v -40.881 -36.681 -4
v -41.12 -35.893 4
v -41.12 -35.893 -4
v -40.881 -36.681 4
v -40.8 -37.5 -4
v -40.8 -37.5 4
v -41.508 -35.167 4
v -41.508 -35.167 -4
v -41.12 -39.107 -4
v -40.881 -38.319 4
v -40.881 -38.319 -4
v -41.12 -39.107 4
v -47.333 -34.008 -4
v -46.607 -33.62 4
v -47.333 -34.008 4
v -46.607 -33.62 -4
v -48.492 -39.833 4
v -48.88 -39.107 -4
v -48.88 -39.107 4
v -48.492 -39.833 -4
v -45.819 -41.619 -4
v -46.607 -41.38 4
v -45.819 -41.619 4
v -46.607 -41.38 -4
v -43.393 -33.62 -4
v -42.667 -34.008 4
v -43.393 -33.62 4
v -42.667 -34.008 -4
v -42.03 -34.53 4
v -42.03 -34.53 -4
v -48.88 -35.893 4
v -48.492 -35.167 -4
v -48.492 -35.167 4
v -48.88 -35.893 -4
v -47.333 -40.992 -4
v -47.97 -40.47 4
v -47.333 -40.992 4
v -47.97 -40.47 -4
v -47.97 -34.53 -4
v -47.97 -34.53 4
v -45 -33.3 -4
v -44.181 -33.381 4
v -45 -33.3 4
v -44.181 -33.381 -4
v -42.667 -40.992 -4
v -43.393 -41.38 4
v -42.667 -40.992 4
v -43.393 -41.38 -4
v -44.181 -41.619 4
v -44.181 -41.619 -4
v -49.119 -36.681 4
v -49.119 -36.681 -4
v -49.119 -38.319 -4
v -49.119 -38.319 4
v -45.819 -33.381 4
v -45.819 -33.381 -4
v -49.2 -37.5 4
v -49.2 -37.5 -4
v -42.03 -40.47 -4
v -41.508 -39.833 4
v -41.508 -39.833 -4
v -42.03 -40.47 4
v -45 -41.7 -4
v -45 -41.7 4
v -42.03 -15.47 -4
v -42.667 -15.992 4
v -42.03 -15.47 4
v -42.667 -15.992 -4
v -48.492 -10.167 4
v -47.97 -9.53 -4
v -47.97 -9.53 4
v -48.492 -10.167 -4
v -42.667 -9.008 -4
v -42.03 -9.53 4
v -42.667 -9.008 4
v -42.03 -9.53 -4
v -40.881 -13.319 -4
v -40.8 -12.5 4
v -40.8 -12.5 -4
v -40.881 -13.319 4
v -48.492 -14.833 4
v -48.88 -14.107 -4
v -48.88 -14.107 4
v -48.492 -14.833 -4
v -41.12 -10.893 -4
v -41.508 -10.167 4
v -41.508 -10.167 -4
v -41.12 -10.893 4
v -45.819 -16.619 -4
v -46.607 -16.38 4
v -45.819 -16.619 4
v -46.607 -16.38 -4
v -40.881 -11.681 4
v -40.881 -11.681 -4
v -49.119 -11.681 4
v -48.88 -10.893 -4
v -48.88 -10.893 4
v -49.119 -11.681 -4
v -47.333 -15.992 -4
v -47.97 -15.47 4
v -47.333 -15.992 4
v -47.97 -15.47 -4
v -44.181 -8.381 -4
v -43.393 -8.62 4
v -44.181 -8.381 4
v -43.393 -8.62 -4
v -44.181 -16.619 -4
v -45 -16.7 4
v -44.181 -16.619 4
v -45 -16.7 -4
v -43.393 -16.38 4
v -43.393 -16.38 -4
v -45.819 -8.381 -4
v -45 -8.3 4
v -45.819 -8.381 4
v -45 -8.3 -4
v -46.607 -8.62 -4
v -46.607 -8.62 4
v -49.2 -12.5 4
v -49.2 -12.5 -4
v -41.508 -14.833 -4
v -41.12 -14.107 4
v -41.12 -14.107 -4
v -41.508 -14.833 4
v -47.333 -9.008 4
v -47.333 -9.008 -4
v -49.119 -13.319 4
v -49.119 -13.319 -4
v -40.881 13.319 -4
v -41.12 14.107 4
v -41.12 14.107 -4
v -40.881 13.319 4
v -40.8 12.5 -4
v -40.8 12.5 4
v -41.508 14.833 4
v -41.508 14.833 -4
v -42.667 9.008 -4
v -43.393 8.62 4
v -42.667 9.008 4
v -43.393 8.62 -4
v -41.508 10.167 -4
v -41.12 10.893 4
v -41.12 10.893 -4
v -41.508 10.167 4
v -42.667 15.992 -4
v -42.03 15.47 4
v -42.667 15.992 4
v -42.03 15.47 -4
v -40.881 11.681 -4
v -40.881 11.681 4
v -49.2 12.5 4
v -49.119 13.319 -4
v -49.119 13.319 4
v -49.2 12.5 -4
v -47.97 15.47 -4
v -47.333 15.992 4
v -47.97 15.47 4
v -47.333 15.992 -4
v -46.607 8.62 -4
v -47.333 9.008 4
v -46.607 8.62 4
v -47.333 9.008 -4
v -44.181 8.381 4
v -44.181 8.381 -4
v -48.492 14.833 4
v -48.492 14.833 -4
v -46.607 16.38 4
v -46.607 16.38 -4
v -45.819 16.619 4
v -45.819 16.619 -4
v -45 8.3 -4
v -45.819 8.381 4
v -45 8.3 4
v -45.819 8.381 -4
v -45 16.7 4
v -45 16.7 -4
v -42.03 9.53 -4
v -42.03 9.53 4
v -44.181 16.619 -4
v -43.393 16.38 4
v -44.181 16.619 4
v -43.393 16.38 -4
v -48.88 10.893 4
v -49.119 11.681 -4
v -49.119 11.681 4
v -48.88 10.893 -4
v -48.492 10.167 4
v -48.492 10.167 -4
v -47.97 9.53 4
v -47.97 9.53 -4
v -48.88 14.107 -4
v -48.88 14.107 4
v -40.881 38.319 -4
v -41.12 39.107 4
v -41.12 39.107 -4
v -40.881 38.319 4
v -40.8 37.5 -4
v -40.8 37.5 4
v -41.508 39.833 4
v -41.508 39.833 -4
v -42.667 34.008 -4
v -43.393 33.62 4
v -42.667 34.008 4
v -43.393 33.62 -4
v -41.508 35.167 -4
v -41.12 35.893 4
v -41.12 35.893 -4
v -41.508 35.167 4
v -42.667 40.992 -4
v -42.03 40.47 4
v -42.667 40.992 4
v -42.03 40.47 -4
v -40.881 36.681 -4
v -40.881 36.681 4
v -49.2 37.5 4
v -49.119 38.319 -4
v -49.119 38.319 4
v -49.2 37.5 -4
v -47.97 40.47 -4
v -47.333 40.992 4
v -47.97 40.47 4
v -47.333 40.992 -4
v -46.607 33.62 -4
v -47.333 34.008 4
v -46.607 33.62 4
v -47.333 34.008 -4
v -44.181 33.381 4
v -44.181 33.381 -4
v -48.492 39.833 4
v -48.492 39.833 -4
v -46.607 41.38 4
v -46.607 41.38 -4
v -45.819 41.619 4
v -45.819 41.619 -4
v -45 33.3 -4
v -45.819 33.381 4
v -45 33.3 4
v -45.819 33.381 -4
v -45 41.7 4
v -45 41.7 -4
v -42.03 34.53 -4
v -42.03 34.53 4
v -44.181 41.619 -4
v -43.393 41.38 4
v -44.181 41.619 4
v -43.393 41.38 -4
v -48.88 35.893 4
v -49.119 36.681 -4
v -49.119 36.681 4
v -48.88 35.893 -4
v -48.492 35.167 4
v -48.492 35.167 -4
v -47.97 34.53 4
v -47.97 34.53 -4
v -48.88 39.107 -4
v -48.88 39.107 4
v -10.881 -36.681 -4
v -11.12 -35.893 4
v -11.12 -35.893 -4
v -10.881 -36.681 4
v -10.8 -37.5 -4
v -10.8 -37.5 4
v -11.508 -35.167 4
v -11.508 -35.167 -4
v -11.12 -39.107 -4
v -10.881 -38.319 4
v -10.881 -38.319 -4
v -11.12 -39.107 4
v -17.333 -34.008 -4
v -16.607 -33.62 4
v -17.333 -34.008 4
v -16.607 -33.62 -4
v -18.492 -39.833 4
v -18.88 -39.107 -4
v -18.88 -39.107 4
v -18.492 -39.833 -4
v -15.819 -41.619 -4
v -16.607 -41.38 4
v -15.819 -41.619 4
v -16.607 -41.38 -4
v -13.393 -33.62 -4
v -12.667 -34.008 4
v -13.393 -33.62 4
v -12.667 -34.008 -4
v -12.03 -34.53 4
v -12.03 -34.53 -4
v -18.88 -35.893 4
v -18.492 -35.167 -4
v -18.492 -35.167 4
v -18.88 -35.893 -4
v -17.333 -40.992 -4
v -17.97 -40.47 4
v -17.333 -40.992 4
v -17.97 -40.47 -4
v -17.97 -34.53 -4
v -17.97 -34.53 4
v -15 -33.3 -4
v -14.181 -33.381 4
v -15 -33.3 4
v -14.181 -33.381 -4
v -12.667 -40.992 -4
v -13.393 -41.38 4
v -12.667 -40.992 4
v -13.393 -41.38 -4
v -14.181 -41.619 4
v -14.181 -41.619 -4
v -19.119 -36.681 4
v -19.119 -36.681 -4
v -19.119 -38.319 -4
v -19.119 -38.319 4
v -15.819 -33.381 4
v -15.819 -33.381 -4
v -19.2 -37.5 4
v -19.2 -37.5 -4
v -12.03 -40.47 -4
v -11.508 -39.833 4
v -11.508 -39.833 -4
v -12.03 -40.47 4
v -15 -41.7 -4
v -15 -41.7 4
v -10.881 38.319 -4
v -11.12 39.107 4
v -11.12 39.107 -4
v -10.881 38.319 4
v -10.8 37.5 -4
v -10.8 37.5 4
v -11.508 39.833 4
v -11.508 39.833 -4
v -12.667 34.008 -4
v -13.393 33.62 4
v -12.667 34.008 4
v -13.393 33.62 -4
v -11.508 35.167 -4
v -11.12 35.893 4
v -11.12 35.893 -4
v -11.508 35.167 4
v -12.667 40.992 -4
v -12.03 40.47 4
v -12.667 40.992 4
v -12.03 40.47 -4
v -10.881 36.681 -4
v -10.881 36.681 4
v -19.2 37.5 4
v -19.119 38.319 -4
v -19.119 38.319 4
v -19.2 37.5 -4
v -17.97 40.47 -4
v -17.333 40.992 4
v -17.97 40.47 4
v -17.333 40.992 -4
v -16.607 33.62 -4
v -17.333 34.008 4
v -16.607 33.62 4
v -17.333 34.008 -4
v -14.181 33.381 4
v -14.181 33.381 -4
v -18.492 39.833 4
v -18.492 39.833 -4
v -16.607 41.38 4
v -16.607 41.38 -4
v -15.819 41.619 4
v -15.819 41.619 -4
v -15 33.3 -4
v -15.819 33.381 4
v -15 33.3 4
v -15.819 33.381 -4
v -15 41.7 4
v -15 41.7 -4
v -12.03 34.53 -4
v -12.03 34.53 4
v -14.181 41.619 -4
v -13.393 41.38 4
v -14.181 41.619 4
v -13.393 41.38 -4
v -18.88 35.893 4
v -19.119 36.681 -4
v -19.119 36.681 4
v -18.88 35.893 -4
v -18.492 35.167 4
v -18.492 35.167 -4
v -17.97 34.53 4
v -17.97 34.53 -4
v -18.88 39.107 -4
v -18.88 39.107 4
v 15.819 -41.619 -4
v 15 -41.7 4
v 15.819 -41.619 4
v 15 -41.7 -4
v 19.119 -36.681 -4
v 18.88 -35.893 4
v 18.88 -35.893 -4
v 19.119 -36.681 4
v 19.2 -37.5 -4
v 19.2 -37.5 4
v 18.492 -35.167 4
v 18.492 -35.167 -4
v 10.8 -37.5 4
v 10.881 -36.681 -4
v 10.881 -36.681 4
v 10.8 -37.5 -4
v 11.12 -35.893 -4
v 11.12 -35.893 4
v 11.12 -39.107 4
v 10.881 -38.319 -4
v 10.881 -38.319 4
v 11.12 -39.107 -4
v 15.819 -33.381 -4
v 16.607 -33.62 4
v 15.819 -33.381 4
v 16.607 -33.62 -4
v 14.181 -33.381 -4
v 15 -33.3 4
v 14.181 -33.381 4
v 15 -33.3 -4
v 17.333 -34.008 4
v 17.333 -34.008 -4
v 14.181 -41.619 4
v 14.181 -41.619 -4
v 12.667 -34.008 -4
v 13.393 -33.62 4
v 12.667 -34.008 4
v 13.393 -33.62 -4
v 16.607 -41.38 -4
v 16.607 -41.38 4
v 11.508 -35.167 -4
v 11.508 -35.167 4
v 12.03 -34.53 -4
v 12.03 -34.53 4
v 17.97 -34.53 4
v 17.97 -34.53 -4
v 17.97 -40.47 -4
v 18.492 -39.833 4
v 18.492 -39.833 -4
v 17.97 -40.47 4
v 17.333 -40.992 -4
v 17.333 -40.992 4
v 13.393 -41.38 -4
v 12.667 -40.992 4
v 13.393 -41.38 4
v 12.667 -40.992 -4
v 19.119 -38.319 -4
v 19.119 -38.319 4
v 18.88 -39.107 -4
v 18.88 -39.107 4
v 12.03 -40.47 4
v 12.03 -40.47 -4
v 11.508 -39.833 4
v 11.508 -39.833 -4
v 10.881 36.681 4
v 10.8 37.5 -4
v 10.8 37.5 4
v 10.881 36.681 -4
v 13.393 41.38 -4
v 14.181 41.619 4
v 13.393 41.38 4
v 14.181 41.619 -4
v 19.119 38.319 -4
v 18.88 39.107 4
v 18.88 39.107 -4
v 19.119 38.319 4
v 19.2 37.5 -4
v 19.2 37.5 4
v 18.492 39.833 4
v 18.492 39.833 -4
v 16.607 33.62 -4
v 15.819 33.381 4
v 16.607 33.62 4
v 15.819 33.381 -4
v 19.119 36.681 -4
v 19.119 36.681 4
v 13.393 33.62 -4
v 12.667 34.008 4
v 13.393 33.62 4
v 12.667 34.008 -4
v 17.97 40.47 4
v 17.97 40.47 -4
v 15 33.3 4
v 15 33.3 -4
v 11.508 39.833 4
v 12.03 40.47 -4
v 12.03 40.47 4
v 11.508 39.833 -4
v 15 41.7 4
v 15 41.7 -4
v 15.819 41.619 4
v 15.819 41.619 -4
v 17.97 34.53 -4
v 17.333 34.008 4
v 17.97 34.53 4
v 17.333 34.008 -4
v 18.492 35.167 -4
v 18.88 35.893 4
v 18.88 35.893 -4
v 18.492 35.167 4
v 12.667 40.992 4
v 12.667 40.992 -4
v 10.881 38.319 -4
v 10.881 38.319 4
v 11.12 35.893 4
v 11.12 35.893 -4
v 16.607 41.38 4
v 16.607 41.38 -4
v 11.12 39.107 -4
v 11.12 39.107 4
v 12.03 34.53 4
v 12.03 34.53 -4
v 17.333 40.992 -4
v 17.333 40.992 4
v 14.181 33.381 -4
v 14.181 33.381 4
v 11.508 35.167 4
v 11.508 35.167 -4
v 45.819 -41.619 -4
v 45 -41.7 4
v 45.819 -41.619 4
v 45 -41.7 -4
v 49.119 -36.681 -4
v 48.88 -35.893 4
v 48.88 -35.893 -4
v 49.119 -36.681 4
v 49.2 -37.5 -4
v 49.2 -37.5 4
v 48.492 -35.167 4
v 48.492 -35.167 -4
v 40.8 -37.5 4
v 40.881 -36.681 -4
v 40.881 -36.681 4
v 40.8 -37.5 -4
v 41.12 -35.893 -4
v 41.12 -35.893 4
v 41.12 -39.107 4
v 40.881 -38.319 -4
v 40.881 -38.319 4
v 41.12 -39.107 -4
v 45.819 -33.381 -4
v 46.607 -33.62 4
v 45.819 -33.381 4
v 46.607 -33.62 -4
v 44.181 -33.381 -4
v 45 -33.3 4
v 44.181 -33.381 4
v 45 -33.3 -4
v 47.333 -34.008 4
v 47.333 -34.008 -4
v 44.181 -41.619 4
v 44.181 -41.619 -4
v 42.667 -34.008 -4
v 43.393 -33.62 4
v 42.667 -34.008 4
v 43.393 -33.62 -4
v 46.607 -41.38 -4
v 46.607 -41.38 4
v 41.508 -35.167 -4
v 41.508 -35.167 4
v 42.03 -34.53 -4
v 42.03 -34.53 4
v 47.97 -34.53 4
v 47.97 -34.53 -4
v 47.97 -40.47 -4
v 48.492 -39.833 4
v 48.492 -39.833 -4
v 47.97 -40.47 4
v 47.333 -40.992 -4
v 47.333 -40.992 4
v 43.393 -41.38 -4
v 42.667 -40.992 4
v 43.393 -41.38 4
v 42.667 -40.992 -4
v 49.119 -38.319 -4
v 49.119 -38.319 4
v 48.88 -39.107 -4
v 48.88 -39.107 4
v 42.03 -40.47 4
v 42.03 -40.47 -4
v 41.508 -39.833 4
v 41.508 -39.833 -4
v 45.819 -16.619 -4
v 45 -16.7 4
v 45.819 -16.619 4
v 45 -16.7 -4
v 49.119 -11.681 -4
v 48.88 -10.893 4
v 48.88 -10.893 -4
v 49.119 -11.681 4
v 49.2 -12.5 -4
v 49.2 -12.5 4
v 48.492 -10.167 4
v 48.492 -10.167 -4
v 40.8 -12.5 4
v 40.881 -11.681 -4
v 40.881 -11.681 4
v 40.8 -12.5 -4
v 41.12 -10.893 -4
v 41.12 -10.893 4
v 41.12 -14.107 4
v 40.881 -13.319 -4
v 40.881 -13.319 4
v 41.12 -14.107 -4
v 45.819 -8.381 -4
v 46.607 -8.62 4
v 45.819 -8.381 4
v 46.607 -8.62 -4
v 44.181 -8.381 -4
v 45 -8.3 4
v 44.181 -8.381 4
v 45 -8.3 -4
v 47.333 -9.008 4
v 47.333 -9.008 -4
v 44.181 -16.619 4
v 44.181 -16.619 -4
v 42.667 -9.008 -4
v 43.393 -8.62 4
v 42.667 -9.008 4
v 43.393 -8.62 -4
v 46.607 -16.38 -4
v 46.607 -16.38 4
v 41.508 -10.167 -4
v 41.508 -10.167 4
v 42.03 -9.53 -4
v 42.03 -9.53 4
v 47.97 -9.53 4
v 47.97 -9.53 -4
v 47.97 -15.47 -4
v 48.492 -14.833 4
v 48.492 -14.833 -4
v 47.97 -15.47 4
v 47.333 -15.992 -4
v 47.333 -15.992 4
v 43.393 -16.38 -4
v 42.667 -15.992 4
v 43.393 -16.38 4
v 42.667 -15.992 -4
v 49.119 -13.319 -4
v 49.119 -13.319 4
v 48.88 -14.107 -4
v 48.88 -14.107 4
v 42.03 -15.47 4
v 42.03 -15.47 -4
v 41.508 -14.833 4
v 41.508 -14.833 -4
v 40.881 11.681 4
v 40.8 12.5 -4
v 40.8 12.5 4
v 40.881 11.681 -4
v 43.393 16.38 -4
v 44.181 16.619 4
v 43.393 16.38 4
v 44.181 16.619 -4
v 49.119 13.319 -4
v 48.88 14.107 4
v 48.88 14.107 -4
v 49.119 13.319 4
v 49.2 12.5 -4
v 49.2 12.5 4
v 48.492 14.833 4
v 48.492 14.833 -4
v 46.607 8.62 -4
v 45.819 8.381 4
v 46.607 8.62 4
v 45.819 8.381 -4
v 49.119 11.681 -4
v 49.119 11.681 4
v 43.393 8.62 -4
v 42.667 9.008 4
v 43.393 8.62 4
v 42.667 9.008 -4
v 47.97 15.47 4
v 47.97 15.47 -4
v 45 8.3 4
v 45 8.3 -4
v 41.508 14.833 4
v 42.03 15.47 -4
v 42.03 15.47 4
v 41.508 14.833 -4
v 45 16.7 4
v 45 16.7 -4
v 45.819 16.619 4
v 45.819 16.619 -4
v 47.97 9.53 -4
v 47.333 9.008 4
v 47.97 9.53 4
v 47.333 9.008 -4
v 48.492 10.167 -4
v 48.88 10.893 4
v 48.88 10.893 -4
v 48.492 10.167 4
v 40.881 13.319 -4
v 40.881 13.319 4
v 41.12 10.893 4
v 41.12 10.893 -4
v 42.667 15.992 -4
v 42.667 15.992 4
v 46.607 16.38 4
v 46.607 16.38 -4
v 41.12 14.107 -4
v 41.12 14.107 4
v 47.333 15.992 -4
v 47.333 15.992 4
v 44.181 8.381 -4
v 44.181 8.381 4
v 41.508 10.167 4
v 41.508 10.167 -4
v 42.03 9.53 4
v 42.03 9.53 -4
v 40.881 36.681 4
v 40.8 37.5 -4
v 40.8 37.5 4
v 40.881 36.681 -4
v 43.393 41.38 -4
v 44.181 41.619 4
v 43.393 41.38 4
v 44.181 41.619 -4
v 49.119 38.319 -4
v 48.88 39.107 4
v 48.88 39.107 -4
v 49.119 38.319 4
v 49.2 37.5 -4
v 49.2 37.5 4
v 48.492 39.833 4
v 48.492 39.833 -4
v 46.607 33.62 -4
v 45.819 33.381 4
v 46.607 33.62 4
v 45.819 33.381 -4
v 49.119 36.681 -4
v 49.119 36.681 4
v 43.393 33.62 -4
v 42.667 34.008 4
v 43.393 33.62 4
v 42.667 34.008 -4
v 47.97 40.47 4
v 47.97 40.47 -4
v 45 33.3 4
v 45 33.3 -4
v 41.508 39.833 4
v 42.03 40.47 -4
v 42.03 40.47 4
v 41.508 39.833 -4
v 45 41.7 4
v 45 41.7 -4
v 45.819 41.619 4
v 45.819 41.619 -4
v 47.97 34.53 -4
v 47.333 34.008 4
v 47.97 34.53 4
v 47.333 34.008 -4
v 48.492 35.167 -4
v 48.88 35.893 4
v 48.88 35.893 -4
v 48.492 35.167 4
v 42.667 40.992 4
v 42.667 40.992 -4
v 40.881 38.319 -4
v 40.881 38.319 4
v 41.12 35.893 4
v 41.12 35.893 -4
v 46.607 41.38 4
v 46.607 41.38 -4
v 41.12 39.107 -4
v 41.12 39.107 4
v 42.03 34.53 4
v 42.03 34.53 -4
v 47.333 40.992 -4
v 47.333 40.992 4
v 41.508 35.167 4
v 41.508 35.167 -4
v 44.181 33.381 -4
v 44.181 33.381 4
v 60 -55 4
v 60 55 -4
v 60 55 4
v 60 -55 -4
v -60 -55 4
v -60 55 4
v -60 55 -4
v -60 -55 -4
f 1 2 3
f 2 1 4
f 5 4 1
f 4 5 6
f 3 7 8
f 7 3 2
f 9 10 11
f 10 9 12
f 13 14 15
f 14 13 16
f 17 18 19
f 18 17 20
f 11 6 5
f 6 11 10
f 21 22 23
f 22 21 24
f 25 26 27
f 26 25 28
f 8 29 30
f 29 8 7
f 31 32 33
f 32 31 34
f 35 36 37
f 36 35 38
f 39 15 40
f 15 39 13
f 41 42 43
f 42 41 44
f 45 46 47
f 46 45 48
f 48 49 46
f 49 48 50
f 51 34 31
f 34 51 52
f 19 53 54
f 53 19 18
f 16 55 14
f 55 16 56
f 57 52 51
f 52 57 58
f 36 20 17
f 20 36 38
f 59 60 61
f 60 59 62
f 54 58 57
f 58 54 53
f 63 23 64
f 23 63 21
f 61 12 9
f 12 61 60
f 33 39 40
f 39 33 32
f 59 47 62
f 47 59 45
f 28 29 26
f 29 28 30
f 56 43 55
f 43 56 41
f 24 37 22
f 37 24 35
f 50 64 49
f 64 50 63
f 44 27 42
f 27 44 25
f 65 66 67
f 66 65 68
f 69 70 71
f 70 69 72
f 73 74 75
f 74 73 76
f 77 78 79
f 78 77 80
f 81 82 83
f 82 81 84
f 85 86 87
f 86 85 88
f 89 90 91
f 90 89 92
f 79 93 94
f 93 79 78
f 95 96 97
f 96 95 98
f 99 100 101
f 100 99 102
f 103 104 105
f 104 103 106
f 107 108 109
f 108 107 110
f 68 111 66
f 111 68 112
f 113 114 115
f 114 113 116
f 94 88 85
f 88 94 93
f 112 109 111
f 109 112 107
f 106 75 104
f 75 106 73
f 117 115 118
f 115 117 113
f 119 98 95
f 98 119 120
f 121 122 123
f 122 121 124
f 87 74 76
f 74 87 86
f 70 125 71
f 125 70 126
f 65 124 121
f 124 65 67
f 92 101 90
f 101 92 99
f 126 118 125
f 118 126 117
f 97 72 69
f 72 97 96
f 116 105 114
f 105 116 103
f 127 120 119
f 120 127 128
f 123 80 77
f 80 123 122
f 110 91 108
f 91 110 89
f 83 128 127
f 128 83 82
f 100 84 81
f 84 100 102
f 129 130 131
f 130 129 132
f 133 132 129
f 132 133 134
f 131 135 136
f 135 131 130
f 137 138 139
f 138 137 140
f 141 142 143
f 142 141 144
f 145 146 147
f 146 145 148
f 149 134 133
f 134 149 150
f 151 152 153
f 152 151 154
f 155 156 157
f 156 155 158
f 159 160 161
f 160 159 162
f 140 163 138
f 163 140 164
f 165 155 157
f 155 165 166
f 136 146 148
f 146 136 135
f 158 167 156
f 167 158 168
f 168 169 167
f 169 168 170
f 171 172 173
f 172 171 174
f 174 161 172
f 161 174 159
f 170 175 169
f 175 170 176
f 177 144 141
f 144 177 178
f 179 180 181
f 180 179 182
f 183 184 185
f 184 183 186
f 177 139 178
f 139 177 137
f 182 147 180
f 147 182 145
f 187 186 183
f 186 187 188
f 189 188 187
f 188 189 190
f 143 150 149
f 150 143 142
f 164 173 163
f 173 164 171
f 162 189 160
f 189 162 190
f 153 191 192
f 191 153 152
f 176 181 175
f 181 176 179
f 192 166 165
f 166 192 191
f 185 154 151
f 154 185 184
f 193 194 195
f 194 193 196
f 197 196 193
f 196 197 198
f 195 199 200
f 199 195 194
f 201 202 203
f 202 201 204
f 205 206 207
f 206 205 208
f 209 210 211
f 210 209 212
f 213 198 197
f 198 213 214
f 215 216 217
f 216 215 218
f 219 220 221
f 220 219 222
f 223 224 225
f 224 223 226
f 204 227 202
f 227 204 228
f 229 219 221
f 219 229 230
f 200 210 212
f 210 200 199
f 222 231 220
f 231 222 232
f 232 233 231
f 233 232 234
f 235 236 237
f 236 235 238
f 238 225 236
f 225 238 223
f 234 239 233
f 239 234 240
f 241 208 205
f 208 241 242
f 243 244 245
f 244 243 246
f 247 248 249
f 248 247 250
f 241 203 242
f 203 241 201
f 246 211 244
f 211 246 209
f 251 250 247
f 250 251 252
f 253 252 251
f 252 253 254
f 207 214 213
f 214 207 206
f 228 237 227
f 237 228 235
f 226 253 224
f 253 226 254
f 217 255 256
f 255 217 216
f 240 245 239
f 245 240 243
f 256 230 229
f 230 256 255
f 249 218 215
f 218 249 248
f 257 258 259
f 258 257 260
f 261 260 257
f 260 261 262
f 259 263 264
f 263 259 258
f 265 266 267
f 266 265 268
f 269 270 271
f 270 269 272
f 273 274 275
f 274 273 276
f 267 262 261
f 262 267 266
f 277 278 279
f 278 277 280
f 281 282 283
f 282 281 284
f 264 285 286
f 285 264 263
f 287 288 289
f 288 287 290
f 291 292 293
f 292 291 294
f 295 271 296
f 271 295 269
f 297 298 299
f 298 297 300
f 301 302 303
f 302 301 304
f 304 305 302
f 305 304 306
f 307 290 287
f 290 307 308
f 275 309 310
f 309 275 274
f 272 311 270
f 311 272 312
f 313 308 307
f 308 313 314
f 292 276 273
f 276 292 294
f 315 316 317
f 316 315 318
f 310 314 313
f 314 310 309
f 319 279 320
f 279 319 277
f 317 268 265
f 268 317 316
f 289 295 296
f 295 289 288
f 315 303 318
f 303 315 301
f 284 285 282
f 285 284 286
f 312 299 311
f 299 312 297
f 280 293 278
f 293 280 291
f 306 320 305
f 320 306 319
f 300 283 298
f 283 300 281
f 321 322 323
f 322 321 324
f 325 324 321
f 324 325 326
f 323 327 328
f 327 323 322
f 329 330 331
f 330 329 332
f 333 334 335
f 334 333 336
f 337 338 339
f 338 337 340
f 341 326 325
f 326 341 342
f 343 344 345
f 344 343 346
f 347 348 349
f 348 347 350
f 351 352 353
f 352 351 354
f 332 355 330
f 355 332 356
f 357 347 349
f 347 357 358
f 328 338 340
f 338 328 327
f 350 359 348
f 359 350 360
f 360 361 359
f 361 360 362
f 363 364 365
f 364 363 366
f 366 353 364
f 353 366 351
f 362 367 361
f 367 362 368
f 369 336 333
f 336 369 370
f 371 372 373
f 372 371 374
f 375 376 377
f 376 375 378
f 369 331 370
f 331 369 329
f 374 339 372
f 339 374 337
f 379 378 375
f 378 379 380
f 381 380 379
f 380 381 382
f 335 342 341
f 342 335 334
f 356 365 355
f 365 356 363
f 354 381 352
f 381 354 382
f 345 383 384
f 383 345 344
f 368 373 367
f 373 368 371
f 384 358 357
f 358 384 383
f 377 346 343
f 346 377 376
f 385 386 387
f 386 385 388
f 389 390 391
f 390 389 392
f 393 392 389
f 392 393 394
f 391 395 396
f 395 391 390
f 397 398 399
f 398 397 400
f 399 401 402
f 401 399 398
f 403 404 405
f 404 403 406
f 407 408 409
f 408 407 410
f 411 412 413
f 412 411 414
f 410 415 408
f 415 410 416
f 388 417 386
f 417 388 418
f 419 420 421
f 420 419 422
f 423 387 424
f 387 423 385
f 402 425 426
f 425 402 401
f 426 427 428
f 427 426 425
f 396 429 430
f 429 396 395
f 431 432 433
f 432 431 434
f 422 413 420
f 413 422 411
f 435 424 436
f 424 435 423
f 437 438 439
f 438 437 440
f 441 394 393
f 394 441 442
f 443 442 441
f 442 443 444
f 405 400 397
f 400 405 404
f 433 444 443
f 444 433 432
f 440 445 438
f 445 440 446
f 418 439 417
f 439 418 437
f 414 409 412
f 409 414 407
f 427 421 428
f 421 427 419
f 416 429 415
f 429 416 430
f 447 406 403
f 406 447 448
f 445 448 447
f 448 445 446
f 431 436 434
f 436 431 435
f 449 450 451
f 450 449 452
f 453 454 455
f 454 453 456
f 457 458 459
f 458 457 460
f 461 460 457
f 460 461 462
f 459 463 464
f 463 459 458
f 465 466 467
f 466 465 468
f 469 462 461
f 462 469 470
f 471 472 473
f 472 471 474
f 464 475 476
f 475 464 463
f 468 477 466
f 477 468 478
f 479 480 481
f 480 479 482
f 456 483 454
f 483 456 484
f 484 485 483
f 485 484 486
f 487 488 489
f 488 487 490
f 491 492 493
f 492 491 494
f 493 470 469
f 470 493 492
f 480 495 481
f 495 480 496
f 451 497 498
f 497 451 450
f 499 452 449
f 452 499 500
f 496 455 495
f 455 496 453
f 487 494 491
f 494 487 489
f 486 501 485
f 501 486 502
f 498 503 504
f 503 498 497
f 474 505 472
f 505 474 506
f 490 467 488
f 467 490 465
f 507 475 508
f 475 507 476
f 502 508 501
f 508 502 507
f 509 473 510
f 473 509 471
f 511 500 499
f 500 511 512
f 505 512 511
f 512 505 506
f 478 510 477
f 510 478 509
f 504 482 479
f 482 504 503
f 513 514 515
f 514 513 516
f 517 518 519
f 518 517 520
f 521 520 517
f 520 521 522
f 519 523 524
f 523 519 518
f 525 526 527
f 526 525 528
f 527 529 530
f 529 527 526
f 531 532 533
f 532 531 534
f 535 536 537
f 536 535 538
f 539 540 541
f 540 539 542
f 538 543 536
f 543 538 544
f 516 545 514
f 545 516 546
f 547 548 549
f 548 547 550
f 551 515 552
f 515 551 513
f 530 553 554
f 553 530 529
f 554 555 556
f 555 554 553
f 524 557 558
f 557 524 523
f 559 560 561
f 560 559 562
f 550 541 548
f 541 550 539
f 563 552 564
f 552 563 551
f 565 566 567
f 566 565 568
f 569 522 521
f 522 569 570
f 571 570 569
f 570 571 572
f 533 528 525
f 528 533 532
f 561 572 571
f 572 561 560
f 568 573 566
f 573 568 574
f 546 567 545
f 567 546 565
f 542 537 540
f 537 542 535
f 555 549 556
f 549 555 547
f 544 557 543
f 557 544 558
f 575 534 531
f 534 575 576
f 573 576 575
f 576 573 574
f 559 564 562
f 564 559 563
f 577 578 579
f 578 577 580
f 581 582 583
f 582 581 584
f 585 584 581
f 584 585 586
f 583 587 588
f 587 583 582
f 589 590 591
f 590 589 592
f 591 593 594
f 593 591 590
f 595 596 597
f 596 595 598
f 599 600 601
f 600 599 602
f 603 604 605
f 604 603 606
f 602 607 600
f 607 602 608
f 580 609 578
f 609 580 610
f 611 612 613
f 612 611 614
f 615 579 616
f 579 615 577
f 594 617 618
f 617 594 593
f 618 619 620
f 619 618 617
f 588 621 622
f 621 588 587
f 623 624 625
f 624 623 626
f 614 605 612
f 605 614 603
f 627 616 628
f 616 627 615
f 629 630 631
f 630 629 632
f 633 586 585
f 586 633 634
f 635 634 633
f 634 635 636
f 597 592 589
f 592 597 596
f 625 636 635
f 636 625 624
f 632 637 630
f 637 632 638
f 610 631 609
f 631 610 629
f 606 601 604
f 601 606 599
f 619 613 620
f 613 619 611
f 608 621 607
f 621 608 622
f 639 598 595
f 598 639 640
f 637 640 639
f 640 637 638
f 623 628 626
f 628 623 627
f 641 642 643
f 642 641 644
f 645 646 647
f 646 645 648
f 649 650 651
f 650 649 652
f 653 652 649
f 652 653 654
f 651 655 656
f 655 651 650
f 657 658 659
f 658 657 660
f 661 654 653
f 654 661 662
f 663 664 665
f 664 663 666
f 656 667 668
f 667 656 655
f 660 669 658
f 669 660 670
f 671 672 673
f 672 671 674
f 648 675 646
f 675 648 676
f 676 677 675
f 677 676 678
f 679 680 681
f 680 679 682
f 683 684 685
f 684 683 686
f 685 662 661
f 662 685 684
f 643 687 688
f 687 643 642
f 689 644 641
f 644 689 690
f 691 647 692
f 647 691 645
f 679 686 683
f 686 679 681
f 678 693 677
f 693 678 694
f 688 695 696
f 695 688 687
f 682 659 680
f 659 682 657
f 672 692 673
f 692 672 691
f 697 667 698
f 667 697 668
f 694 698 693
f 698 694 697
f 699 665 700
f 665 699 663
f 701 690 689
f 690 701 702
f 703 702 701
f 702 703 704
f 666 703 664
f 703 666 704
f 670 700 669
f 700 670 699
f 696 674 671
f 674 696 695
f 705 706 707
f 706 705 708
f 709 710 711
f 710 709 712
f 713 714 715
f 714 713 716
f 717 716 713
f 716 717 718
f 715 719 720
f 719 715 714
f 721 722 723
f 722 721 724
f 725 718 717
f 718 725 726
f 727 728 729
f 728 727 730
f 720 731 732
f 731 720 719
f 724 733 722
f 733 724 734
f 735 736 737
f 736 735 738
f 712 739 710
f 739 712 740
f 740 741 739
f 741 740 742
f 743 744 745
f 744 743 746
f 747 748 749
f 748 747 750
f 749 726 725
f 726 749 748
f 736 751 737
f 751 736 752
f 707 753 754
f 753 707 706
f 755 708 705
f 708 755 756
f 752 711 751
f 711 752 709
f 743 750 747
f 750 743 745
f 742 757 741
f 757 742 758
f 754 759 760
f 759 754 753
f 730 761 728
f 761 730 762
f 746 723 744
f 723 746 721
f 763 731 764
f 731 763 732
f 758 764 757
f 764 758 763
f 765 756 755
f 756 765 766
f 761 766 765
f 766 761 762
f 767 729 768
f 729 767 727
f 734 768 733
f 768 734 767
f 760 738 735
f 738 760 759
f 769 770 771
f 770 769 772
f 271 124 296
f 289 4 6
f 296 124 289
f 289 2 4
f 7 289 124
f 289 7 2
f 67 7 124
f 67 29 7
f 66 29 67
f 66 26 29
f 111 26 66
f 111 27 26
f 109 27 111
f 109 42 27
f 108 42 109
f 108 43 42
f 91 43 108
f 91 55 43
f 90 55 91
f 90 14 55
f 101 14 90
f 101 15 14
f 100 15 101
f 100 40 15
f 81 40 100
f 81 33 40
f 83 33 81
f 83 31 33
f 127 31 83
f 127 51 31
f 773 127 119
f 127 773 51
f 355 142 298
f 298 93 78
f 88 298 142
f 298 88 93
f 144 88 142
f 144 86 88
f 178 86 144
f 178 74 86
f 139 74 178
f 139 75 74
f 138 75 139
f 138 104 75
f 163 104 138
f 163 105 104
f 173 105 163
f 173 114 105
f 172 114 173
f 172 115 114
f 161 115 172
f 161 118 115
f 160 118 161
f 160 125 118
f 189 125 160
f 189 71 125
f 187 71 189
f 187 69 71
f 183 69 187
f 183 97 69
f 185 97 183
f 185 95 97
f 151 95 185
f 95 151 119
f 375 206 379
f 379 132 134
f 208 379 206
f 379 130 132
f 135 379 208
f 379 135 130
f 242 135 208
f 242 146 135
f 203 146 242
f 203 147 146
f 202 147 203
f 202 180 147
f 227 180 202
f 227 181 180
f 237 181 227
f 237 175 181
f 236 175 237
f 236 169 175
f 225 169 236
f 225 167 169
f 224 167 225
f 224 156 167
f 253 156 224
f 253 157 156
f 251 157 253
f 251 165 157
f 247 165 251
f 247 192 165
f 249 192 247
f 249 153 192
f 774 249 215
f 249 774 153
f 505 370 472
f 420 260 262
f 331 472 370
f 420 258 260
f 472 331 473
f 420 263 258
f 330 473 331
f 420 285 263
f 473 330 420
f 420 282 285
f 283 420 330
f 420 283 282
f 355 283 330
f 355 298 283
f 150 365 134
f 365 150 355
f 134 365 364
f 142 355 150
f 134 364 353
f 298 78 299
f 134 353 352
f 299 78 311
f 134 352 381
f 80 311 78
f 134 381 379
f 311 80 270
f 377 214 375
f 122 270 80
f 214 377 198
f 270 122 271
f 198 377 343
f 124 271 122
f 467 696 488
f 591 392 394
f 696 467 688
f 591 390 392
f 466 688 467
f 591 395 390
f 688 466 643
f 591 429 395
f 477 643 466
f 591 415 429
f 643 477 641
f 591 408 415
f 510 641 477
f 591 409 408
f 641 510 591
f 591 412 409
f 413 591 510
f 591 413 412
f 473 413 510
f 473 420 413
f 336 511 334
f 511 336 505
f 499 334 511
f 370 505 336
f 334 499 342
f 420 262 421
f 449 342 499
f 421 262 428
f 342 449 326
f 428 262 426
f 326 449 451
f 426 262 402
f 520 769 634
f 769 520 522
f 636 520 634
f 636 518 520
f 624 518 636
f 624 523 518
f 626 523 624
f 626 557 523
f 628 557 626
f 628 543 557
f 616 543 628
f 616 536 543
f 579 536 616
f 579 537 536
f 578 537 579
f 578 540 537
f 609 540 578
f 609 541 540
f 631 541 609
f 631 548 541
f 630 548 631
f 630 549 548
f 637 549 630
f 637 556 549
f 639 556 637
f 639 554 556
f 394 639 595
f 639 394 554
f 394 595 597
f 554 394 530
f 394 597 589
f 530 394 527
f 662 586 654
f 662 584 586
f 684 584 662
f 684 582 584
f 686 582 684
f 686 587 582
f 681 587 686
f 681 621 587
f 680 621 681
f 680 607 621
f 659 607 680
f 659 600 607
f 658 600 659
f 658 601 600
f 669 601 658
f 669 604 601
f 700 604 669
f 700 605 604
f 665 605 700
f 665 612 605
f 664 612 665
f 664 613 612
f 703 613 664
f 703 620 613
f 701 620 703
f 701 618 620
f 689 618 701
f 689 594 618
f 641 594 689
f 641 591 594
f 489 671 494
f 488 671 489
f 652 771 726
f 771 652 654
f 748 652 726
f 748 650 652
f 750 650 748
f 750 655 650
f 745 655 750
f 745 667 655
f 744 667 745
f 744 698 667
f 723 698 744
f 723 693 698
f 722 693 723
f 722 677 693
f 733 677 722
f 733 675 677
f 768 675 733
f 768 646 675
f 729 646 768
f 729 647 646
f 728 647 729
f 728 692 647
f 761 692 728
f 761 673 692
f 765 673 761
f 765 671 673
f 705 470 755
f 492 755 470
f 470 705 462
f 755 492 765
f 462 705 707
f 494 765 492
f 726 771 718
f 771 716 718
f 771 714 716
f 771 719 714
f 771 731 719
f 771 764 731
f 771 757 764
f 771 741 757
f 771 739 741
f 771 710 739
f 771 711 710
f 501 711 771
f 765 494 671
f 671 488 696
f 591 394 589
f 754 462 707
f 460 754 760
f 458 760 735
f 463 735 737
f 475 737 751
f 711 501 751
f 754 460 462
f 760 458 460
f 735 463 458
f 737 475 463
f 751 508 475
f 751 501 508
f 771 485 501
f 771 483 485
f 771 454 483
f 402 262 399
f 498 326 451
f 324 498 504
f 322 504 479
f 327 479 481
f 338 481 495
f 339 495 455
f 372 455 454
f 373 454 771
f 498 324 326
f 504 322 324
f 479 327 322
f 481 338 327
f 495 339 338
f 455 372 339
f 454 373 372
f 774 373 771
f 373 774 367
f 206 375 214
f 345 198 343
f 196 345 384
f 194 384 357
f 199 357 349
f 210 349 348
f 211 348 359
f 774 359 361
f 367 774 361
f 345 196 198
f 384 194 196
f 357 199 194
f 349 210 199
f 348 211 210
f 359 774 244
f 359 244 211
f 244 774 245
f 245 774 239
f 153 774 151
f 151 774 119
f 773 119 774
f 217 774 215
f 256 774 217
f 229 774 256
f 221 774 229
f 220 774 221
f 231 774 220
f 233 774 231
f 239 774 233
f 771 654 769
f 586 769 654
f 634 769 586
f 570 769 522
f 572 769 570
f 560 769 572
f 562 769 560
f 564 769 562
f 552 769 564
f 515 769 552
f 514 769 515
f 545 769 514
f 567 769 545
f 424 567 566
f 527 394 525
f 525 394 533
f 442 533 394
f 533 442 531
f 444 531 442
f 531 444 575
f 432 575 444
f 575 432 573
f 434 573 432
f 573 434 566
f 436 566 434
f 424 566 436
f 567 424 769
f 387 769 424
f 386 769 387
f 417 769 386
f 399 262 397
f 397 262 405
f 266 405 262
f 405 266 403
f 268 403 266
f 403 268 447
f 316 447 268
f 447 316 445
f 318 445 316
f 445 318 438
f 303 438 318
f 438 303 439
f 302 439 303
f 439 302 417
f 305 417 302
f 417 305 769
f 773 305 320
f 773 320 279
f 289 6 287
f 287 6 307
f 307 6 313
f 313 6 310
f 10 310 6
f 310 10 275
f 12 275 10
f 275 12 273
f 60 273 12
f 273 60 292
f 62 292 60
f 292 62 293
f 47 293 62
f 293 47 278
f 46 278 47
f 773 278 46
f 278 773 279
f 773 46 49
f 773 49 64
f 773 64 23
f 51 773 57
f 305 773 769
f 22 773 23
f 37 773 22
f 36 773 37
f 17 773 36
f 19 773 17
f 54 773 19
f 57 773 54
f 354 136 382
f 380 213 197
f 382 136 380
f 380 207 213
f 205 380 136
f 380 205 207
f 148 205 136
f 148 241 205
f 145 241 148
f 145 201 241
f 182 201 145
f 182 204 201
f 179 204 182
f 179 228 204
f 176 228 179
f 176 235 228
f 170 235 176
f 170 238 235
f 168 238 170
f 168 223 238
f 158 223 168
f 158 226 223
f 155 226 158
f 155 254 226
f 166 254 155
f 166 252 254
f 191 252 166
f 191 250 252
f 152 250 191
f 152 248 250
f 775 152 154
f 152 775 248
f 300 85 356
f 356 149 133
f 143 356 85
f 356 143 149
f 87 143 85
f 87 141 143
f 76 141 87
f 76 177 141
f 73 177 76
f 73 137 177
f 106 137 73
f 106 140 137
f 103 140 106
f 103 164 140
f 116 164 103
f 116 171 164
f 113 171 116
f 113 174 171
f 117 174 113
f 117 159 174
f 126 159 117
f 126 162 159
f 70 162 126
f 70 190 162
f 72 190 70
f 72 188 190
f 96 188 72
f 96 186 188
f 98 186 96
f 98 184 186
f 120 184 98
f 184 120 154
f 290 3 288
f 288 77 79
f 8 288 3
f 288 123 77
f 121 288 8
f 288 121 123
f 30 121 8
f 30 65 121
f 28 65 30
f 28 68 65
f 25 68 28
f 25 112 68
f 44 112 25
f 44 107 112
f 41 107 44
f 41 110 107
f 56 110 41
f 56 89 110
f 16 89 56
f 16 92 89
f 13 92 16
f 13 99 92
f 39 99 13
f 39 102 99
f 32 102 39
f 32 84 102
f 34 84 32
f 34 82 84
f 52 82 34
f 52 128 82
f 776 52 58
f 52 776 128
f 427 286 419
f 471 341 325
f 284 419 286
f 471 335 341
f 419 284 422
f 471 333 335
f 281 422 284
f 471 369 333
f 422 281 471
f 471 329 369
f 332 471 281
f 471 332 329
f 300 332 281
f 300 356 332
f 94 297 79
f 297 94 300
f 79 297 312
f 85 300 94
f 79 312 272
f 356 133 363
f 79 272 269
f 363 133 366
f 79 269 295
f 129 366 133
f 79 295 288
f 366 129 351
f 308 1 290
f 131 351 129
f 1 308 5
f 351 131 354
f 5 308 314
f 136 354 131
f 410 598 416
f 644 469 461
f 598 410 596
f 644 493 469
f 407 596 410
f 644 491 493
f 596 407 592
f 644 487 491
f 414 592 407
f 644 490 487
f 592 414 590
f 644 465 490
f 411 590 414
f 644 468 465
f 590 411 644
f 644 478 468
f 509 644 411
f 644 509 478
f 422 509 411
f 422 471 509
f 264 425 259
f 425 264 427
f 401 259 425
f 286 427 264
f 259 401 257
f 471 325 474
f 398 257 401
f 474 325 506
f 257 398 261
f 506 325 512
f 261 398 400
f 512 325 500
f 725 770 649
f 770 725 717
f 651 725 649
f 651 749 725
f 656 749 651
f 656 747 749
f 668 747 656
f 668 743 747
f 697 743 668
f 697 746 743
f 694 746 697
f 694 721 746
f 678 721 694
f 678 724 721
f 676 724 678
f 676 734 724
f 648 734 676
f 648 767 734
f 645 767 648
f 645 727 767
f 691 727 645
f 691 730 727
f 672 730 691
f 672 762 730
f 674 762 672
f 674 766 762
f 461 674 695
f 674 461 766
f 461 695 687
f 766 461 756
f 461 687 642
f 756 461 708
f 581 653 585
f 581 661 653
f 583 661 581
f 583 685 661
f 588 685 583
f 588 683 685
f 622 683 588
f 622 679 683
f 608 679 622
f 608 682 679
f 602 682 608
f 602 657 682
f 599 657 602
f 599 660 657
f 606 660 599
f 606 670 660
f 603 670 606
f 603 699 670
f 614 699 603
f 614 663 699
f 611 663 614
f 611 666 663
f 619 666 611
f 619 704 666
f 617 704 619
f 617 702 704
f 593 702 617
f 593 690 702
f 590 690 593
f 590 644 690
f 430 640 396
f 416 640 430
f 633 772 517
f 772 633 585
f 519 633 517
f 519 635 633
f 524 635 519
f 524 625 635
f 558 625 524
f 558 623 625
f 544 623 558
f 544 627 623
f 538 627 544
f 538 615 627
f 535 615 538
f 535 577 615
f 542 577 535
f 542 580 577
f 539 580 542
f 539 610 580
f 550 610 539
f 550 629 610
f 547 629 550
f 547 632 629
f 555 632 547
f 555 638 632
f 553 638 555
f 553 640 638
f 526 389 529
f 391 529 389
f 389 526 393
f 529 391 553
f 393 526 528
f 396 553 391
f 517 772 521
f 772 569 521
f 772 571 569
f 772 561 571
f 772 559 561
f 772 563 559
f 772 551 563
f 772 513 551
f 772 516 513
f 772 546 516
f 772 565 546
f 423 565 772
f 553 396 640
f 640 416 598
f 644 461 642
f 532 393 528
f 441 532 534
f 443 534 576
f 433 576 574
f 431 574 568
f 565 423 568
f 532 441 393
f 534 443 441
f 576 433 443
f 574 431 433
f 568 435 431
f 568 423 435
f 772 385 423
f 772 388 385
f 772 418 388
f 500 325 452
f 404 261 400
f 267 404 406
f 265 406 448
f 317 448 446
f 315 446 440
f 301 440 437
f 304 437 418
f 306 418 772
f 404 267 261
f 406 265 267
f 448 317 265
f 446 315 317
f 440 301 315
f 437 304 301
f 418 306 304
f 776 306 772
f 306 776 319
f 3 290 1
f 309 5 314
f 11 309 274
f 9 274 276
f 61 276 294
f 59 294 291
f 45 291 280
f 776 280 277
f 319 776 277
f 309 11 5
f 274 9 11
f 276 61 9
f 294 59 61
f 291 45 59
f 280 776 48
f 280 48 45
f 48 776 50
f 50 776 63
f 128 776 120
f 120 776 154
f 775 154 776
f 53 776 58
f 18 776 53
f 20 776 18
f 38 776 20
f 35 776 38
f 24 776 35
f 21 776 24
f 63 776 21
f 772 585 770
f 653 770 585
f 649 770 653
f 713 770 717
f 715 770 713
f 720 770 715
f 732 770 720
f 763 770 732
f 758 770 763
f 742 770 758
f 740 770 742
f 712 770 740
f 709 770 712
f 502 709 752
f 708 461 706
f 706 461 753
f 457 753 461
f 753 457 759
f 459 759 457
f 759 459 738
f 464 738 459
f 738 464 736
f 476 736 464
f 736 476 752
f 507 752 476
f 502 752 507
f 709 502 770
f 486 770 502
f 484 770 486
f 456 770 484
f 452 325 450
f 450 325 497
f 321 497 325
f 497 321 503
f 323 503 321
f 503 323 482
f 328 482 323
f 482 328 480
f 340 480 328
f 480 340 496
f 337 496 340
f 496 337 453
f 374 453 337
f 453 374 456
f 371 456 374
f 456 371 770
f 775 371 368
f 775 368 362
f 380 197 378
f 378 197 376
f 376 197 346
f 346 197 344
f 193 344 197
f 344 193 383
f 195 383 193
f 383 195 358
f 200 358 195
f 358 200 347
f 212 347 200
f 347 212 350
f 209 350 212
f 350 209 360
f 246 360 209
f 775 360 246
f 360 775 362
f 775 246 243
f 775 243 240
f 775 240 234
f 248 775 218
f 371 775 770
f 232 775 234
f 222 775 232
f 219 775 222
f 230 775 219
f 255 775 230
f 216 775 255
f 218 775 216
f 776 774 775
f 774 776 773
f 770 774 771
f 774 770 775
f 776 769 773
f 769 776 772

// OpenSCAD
$fn = 32;

// ----------------------------------------------------------------------
// Perforated panel 120 x 110 x 8
// 4 x 4 Ø8.4 holes, frame layout
// ----------------------------------------------------------------------

// --- parameters (mm) ---
panel = [120, 110, 8];  // overall size (x, y, z)
hole_d = 8.4;           // hole diameter
pitch_x = 30;           // hole pitch along X
pitch_y = 25;           // hole pitch along Y

// --- derived feature positions (mm) ---
margin = hole_d / 2 + 2;            // = 6.2   clearance from the panel edge
cols = floor((panel[0] - 2 * margin) / pitch_x) + 1;  // = 4   how many columns fit in X
rows = floor((panel[1] - 2 * margin) / pitch_y) + 1;  // = 4   how many rows fit in Y
span_x = (cols - 1) * pitch_x + 0;  // = 90   width of the field
span_y = (rows - 1) * pitch_y;      // = 75   height of the field
origin_x = -span_x / 2;             // = -45   X of the first hole
origin_y = -span_y / 2;             // = -37.5   Y of the first row
holes = 2 * cols + 2 * (rows - 2);  // = 12   holes around the frame
feature_centers = [
  [origin_x + 0 * pitch_x, origin_y + 0 * pitch_y],
  [origin_x + 0 * pitch_x, origin_y + 1 * pitch_y],
  [origin_x + 0 * pitch_x, origin_y + 2 * pitch_y],
  [origin_x + 0 * pitch_x, origin_y + 3 * pitch_y],
  [origin_x + 1 * pitch_x, origin_y + 0 * pitch_y],
  [origin_x + 1 * pitch_x, origin_y + 3 * pitch_y],
  [origin_x + 2 * pitch_x, origin_y + 0 * pitch_y],
  [origin_x + 2 * pitch_x, origin_y + 3 * pitch_y],
  [origin_x + 3 * pitch_x, origin_y + 0 * pitch_y],
  [origin_x + 3 * pitch_x, origin_y + 1 * pitch_y],
  [origin_x + 3 * pitch_x, origin_y + 2 * pitch_y],
  [origin_x + 3 * pitch_x, origin_y + 3 * pitch_y]
];   // hole centres, used verbatim by the cutter loop

// panel outline, every hole through
difference() {
  cube(panel, center = true);
  for (centre = feature_centers)
    translate([centre[0], centre[1], 0])
      cylinder(d = hole_d, h = panel[2] + 2, center = true);
}
